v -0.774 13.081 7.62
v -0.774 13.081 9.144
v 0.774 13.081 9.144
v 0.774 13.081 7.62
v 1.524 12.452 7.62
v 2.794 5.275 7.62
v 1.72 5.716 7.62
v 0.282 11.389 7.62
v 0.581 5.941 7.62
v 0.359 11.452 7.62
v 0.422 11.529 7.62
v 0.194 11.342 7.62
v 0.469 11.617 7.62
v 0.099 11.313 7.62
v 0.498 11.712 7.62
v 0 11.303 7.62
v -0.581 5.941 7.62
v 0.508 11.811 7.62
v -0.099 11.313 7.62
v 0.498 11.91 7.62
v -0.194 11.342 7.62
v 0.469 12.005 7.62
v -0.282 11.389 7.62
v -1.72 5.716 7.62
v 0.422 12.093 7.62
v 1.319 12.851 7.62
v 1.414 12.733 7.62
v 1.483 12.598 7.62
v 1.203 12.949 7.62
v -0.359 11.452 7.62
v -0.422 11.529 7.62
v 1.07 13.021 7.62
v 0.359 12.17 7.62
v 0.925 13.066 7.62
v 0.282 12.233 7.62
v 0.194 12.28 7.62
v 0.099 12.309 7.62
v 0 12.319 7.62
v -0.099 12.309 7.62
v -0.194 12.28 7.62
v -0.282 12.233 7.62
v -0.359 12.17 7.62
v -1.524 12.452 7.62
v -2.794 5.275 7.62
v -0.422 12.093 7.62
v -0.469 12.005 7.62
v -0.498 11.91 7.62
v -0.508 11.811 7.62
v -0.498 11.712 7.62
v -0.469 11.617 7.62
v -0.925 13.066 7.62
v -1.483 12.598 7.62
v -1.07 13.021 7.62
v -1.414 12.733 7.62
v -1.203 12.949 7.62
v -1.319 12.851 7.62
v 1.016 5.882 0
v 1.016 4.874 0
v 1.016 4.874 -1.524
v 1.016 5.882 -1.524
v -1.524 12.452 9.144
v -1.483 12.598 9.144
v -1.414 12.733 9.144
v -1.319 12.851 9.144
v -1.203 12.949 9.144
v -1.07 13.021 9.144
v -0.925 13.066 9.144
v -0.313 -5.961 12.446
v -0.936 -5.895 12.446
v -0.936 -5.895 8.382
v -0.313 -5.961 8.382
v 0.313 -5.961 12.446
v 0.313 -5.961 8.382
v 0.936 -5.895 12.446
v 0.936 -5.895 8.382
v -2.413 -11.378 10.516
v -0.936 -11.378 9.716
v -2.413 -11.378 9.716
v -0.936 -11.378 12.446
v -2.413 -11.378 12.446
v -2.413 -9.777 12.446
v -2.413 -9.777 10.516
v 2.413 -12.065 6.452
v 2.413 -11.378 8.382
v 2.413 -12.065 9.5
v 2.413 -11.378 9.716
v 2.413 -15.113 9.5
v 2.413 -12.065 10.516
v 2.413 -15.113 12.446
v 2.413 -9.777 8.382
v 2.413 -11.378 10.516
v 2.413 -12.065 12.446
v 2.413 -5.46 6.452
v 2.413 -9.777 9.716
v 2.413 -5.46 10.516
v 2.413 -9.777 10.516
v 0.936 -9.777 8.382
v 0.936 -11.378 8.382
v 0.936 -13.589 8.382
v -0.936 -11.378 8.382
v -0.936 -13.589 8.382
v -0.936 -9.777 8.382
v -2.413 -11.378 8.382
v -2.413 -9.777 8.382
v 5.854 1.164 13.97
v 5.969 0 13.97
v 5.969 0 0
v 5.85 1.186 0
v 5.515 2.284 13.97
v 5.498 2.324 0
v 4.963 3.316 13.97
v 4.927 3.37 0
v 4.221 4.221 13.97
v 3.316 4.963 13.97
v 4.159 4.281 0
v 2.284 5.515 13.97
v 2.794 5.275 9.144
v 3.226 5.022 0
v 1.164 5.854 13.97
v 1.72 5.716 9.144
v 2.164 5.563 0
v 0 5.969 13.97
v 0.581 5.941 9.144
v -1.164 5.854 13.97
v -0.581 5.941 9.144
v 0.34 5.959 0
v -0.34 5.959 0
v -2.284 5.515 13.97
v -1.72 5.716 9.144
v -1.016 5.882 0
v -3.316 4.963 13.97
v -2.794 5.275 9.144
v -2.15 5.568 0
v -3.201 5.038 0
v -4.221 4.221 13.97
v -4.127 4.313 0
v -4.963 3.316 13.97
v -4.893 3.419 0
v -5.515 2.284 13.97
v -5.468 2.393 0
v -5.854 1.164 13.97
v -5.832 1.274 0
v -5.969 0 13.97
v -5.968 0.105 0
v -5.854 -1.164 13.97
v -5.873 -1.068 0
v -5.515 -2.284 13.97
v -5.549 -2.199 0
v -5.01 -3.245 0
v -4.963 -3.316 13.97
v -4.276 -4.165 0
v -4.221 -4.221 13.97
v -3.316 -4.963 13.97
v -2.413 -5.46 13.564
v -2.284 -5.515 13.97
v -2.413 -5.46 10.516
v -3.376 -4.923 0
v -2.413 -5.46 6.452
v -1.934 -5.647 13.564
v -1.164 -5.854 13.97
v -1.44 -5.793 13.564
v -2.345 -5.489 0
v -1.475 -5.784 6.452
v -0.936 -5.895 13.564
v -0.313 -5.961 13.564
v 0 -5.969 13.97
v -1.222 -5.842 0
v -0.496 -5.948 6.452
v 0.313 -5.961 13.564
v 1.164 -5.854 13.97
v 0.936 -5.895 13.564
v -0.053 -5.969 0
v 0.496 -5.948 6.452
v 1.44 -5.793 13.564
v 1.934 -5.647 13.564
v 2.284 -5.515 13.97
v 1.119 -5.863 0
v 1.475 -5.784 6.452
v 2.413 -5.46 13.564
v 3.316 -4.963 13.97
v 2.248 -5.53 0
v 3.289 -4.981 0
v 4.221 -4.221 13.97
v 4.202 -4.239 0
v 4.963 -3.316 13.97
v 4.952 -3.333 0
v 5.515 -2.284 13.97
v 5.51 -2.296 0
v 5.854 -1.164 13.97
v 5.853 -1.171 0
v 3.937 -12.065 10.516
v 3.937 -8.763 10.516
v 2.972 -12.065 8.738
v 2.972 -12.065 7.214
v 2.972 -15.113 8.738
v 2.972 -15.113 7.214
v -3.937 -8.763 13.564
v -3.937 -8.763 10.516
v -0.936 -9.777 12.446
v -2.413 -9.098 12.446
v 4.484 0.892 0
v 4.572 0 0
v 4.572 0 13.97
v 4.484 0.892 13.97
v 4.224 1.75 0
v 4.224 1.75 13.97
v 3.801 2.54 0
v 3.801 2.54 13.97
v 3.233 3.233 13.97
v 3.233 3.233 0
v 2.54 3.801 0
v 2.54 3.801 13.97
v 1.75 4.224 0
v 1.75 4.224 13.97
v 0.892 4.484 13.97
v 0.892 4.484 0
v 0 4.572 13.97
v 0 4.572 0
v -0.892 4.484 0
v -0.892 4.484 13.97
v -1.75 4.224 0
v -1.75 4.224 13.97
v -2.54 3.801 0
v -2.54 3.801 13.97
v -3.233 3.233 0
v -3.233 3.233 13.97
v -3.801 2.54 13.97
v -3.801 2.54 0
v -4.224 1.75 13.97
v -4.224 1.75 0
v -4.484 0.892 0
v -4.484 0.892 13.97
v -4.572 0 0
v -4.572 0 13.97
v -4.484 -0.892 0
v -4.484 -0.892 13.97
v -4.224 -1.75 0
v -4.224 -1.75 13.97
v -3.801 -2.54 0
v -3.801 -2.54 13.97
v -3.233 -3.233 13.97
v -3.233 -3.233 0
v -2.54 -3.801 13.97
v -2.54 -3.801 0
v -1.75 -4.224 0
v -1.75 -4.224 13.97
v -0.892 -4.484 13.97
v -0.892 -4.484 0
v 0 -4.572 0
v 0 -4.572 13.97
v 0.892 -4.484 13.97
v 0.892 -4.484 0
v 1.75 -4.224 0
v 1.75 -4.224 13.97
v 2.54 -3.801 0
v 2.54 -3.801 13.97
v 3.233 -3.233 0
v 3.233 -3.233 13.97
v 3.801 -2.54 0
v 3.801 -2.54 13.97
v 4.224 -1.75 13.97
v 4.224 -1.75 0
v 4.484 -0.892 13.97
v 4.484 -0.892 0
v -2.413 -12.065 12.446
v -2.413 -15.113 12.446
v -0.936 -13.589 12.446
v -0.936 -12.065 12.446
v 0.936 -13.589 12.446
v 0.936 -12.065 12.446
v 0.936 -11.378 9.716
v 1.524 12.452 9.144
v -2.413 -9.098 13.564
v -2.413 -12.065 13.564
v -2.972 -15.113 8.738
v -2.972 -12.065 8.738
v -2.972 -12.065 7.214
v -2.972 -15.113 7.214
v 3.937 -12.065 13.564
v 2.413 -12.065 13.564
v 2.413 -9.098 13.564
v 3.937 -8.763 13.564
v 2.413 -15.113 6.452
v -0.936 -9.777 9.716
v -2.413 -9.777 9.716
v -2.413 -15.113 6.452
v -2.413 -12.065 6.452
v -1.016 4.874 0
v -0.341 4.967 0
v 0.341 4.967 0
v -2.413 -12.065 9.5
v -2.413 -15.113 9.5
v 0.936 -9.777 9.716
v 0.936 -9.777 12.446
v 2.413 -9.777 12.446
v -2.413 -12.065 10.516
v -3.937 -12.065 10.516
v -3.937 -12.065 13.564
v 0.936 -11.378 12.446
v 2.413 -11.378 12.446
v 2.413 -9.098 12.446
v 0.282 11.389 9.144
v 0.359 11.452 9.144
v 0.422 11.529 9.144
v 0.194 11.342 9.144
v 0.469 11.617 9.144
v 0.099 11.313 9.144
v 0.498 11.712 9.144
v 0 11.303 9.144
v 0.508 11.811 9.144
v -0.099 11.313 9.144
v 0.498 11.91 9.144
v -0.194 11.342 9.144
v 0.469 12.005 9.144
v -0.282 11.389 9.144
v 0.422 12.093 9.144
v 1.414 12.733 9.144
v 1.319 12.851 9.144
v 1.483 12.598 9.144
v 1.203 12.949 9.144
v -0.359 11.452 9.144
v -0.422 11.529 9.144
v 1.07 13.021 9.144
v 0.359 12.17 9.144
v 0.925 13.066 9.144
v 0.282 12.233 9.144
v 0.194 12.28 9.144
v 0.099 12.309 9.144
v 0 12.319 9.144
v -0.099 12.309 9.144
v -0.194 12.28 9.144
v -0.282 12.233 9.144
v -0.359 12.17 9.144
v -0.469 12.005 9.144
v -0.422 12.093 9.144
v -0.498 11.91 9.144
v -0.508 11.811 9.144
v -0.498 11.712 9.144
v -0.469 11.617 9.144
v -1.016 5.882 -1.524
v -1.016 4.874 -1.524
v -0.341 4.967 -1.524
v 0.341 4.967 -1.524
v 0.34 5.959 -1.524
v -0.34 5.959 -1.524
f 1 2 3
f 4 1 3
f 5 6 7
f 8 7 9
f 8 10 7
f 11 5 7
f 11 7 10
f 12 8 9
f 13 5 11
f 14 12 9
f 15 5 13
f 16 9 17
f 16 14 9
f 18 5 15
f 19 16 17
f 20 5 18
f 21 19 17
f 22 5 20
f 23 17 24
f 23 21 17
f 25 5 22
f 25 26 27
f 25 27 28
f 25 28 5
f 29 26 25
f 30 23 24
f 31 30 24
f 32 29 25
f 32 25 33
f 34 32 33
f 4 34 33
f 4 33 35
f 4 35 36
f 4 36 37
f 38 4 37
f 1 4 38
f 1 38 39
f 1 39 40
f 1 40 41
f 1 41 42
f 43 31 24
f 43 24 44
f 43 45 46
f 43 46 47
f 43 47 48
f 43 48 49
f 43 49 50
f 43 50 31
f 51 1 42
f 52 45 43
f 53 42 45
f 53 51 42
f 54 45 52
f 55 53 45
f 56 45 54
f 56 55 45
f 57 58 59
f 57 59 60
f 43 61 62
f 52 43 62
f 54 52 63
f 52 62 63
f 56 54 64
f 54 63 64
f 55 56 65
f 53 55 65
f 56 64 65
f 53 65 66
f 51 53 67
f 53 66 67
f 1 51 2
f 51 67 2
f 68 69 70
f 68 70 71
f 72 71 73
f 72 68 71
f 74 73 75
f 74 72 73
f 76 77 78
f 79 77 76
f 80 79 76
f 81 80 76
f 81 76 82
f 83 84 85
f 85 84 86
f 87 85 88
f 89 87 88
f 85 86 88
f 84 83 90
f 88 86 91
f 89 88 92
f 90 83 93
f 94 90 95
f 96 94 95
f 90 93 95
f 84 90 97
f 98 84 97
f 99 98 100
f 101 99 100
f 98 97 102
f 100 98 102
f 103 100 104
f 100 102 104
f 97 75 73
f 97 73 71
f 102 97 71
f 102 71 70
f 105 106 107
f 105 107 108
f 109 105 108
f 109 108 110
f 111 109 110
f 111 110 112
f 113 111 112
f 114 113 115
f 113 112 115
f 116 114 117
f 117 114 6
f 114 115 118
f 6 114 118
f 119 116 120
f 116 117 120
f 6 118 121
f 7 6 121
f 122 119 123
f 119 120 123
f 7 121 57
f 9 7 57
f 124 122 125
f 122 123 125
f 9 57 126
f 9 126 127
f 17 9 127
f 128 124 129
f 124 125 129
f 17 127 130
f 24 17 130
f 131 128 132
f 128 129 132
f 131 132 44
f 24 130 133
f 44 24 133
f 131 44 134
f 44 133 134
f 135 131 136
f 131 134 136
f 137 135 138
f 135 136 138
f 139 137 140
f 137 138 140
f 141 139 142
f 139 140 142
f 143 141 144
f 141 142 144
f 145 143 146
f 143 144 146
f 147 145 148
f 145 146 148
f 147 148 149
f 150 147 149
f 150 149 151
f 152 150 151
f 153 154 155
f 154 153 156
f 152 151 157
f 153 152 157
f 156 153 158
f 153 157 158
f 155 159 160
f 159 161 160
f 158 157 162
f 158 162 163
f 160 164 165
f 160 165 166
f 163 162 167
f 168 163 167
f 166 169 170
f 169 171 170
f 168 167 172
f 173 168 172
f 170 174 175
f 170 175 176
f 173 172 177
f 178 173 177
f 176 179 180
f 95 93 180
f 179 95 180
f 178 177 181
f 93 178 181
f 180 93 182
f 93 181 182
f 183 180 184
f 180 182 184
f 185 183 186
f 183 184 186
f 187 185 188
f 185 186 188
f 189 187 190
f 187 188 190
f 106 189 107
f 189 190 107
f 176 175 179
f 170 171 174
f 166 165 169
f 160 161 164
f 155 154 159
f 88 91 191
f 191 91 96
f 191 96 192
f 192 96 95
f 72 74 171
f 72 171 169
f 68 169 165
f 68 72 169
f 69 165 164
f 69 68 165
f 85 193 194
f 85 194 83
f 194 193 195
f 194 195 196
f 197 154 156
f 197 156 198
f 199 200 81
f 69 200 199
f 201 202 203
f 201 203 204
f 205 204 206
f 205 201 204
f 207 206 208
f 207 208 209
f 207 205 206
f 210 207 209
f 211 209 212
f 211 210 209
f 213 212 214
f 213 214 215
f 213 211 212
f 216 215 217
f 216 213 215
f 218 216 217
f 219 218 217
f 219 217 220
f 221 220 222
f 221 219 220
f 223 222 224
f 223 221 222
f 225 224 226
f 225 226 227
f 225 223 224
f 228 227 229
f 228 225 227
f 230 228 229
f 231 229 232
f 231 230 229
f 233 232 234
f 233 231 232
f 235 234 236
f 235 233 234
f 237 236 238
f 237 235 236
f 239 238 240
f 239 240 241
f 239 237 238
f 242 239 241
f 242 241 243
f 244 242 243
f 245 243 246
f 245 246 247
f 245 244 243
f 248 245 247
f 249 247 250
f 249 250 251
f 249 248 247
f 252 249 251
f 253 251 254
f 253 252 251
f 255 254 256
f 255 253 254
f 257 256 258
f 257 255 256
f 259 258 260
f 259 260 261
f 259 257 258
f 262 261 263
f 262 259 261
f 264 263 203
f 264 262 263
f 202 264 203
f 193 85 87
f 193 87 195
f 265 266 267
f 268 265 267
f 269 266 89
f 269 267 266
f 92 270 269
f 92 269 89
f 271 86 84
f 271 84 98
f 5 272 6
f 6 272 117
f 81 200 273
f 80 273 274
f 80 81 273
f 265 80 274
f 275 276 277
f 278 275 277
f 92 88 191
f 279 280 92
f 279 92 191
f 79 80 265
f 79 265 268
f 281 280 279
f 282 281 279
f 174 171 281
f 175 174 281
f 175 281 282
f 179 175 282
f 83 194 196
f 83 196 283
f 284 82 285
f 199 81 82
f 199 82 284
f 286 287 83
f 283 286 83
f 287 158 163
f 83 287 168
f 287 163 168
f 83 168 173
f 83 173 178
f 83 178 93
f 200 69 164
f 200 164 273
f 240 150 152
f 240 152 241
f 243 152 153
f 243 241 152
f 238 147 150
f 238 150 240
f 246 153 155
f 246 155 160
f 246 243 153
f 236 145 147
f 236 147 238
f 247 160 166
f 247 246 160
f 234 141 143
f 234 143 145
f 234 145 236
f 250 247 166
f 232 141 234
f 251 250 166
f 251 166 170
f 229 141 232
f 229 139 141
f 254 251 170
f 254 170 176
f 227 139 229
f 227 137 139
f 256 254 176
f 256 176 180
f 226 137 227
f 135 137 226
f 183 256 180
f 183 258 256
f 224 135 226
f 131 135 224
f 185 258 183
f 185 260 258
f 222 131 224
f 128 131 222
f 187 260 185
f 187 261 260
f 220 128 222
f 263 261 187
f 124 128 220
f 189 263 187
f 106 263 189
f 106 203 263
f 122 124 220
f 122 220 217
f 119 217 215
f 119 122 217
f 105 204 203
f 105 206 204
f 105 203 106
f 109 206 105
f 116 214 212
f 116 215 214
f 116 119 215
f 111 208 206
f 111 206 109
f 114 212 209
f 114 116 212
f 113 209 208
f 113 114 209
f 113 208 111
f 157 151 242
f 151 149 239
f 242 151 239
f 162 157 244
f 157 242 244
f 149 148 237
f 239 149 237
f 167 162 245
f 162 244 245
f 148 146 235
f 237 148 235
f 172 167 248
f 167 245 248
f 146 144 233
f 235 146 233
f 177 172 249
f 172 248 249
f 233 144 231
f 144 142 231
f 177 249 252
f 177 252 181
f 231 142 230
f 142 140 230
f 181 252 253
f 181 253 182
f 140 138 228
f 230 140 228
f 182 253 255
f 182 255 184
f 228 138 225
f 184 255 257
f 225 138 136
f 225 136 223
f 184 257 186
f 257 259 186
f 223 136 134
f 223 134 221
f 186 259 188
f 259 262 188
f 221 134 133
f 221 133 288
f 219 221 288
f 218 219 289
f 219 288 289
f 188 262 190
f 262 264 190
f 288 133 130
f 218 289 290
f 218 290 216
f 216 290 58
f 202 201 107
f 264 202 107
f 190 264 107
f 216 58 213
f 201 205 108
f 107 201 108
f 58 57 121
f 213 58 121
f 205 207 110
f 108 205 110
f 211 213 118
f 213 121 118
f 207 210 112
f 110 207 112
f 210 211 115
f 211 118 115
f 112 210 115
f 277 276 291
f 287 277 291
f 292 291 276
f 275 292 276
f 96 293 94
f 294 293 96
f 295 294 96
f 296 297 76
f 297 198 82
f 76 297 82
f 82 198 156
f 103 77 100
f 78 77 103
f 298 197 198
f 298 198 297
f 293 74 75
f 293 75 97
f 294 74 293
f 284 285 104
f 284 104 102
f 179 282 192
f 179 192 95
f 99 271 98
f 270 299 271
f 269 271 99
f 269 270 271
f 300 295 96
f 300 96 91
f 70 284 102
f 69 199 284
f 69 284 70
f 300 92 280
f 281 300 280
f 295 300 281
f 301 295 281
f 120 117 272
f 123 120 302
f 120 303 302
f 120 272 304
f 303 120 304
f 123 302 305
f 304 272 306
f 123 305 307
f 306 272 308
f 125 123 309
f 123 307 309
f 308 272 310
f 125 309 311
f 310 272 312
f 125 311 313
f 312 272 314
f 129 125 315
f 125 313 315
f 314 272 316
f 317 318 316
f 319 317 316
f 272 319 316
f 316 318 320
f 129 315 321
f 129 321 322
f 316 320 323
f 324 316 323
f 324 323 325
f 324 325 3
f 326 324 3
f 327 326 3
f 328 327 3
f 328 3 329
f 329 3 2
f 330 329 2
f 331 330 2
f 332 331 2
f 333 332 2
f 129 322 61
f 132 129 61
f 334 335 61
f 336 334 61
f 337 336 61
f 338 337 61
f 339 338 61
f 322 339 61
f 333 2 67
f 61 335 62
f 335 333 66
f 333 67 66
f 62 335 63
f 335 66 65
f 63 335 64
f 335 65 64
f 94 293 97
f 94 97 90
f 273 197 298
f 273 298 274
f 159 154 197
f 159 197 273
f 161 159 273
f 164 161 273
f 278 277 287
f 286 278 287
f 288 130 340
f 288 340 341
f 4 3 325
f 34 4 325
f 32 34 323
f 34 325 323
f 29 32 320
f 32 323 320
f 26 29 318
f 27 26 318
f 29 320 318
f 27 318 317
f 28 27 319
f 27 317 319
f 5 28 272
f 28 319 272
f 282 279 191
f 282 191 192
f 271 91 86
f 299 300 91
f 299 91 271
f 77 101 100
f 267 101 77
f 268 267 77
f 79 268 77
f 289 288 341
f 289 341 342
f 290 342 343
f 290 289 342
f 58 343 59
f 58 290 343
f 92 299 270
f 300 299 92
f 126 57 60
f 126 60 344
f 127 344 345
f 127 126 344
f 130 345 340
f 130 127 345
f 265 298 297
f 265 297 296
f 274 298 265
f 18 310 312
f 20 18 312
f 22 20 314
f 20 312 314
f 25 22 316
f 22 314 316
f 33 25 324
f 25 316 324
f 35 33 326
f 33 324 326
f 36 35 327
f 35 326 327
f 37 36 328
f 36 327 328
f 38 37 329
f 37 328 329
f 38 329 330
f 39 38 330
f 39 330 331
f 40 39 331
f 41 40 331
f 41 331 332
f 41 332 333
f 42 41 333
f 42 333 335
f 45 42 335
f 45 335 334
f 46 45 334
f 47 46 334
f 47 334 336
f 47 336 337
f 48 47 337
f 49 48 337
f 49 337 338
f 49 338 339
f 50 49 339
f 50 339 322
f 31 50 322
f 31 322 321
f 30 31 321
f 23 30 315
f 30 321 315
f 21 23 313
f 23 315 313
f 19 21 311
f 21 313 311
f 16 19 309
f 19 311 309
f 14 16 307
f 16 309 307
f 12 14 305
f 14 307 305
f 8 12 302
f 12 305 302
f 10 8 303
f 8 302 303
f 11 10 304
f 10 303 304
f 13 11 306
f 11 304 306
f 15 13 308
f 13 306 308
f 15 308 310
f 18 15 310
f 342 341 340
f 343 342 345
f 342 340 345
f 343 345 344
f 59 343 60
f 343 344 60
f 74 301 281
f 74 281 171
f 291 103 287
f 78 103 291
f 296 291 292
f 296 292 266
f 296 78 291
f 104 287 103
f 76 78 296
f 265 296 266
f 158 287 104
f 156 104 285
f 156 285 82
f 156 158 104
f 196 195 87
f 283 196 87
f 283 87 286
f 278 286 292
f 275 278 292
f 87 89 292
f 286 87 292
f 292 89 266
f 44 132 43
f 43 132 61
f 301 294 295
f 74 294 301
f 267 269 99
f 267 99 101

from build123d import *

# Parameters (mm, degrees)
SKETCH1_R           = 5.969
SKETCH1_R_2         = 4.572
BASE_EXTRUDE_DEPTH  = 13.97
BOSS_EXTRUDE1_DEPTH = 7.112
SKETCH3_W           = 4.826
SKETCH3_H           = 3.048
CUT_EXTRUDE1_DEPTH  = 1.524
CUT_EXTRUDE2_START  = -6.605477
SKETCH4_W           = 1.524
SKETCH4_H           = 4.064
CUT_EXTRUDE2_DEPTH  = 6.605477
CUT_EXTRUDE3_REACH  = 10.382
SKETCH5_R           = 0.8001
BOSS_EXTRUDE2_DEPTH = 1.524
SKETCH7_R           = 0.508
CUT_EXTRUDE4_DEPTH  = 10.144
BOSS_EXTRUDE3_DEPTH = 1.524
BOSS_EXTRUDE4_START = -3.048
BOSS_EXTRUDE4_DEPTH = 3.048
CUT_EXTRUDE5_START  = -1.1176
CUT_EXTRUDE5_DEPTH  = 1.1176
CUT_EXTRUDE6_DEPTH  = 4.064


with BuildPart() as part:
    # Sketch1 → Base-Extrude (new body)
    with BuildSketch(Plane.XY):
        Circle(SKETCH1_R)
        Circle(SKETCH1_R_2, mode=Mode.SUBTRACT)
    extrude(amount=BASE_EXTRUDE_DEPTH)

    # Sketch2 → Boss-Extrude1 (add)
    with BuildSketch(Plane.XY.offset(13.5636)):
        with BuildLine():
            Line((-2.413, -5.459523056), (-3.937, -8.763))
            Line((-3.937, -8.763), (-3.937, -12.065))
            Line((-3.937, -12.065), (-2.413, -12.065))
            Line((-2.413, -12.065), (-2.413, -15.113))
            Line((-2.413, -15.113), (2.413, -15.113))
            Line((2.413, -15.113), (2.413, -12.065))
            Line((2.413, -12.065), (3.937, -12.065))
            Line((3.937, -12.065), (3.937, -8.763))
            Line((3.937, -8.763), (2.413, -5.459523056))
            ThreePointArc((2.413, -5.459523056), (0, -5.969), (-2.413, -5.459523056))
        make_face()
    extrude(amount=-BOSS_EXTRUDE1_DEPTH)

    # Sketch3 → Cut-Extrude1 (cut)
    with BuildSketch(Plane.XY.offset(13.97)):
        with Locations((0, -13.589)):
            Rectangle(SKETCH3_W, SKETCH3_H)
    extrude(amount=-CUT_EXTRUDE1_DEPTH, mode=Mode.SUBTRACT)

    # Sketch4 → Cut-Extrude2 (cut)
    with BuildSketch(Plane.XZ.offset(12.065).offset(CUT_EXTRUDE2_START)):
        with Locations((3.175, 8.4836)):
            Rectangle(SKETCH4_W, SKETCH4_H)
        with Locations((-3.175, 8.4836)):
            Rectangle(SKETCH4_W, SKETCH4_H)
    extrude(amount=CUT_EXTRUDE2_DEPTH, mode=Mode.SUBTRACT)

    # Sketch5 → Cut-Extrude3 (cut, up to next)
    with BuildSketch(Plane(origin=(2.413, 0, 0), x_dir=(0, 0, -1), z_dir=(1, 0, 0)), mode=Mode.PRIVATE) as cut_extrude3_sk1:
        with Locations((-9.7155, -10.577465123)):
            Circle(SKETCH5_R)
    cut_extrude3_tool1 = extrude(cut_extrude3_sk1.sketch, amount=-CUT_EXTRUDE3_REACH, mode=Mode.PRIVATE) & part.part
    add(cut_extrude3_tool1.solids().sort_by_distance((2.413, -10.577465, 9.7155))[0], mode=Mode.SUBTRACT)

    # Sketch6 → Boss-Extrude2 (add)
    with BuildSketch(Plane.XY.offset(9.144)):
        with BuildLine():
            Line((-2.794, 5.274706153), (-1.524, 12.451775059))
            ThreePointArc((-1.524, 12.451775059), (-1.263283995, 12.902874385), (-0.773656889, 13.081))
            Line((-0.773656889, 13.081), (0.773656889, 13.081))
            ThreePointArc((0.773656889, 13.081), (1.263283995, 12.902874385), (1.524, 12.451775059))
            Line((1.524, 12.451775059), (2.794, 5.274706153))
            ThreePointArc((2.794, 5.274706153), (0, 5.969), (-2.794, 5.274706153))
        make_face()
    extrude(amount=-BOSS_EXTRUDE2_DEPTH)

    # Sketch7 → Cut-Extrude4 (cut, through all)
    with BuildSketch(Plane.XY.offset(9.144)):
        with Locations((0, 11.811)):
            Circle(SKETCH7_R)
    extrude(amount=-CUT_EXTRUDE4_DEPTH, mode=Mode.SUBTRACT)

    # Sketch8 → Boss-Extrude3 (add)
    with BuildSketch(Plane(origin=(0, 0, 0), x_dir=(-1, 0, 0), z_dir=(0, 0, -1))):
        with BuildLine():
            Line((-1.016, 4.873623966), (-1.016, 5.881896378))
            ThreePointArc((-1.016, 5.881896378), (0, 5.969), (1.016, 5.881896378))
            Line((1.016, 5.881896378), (1.016, 4.873623966))
            ThreePointArc((1.016, 4.873623966), (0, 4.9784), (-1.016, 4.873623966))
        make_face()
    extrude(amount=BOSS_EXTRUDE3_DEPTH)

    # Sketch9 → Boss-Extrude4 (add)
    with BuildSketch(Plane.XZ.offset(15.113).offset(BOSS_EXTRUDE4_START)):
        Polygon((2.413, 9.4996), (2.9718, 8.7376), (2.9718, 7.2136), (2.413, 6.4516), align=None)
        Polygon((-2.413, 9.4996), (-2.9718, 8.7376), (-2.9718, 7.2136), (-2.413, 6.4516), align=None)
    extrude(amount=BOSS_EXTRUDE4_DEPTH)

    # Sketch10 → Cut-Extrude5 (cut)
    with BuildSketch(Plane.XY.offset(13.5636).offset(CUT_EXTRUDE5_START)):
        with BuildLine():
            Line((-2.413, -12.065), (2.413, -12.065))
            Line((2.413, -12.065), (2.413, -9.097590664))
            Line((2.413, -9.097590664), (0.935640411, -5.895213145))
            ThreePointArc((0.935640411, -5.895213145), (0, -5.969), (-0.935640411, -5.895213145))
            Line((-0.935640411, -5.895213145), (-2.413, -9.097590664))
            Line((-2.413, -9.097590664), (-2.413, -12.065))
        make_face()
    extrude(amount=CUT_EXTRUDE5_DEPTH, mode=Mode.SUBTRACT)

    # Sketch12 → Cut-Extrude6 (cut)
    with BuildSketch(Plane.XY.offset(12.446)):
        with BuildLine():
            Line((0.935640411, -5.895213145), (0.935640411, -9.777365123))
            Line((0.935640411, -9.777365123), (2.413, -9.777365123))
            Line((2.413, -9.777365123), (2.413, -11.377565123))
            Line((2.413, -11.377565123), (0.935640411, -11.377565123))
            Line((0.935640411, -11.377565123), (0.935640411, -13.589))
            Line((0.935640411, -13.589), (-0.935640411, -13.589))
            Line((-0.935640411, -13.589), (-0.935640411, -11.377565123))
            Line((-0.935640411, -11.377565123), (-2.413, -11.377565123))
            Line((-2.413, -11.377565123), (-2.413, -9.777365123))
            Line((-2.413, -9.777365123), (-0.935640411, -9.777365123))
            Line((-0.935640411, -9.777365123), (-0.935640411, -5.895213145))
            ThreePointArc((-0.935640411, -5.895213145), (0, -5.969), (0.935640411, -5.895213145))
        make_face()
    extrude(amount=-CUT_EXTRUDE6_DEPTH, mode=Mode.SUBTRACT)


solid = part.part
